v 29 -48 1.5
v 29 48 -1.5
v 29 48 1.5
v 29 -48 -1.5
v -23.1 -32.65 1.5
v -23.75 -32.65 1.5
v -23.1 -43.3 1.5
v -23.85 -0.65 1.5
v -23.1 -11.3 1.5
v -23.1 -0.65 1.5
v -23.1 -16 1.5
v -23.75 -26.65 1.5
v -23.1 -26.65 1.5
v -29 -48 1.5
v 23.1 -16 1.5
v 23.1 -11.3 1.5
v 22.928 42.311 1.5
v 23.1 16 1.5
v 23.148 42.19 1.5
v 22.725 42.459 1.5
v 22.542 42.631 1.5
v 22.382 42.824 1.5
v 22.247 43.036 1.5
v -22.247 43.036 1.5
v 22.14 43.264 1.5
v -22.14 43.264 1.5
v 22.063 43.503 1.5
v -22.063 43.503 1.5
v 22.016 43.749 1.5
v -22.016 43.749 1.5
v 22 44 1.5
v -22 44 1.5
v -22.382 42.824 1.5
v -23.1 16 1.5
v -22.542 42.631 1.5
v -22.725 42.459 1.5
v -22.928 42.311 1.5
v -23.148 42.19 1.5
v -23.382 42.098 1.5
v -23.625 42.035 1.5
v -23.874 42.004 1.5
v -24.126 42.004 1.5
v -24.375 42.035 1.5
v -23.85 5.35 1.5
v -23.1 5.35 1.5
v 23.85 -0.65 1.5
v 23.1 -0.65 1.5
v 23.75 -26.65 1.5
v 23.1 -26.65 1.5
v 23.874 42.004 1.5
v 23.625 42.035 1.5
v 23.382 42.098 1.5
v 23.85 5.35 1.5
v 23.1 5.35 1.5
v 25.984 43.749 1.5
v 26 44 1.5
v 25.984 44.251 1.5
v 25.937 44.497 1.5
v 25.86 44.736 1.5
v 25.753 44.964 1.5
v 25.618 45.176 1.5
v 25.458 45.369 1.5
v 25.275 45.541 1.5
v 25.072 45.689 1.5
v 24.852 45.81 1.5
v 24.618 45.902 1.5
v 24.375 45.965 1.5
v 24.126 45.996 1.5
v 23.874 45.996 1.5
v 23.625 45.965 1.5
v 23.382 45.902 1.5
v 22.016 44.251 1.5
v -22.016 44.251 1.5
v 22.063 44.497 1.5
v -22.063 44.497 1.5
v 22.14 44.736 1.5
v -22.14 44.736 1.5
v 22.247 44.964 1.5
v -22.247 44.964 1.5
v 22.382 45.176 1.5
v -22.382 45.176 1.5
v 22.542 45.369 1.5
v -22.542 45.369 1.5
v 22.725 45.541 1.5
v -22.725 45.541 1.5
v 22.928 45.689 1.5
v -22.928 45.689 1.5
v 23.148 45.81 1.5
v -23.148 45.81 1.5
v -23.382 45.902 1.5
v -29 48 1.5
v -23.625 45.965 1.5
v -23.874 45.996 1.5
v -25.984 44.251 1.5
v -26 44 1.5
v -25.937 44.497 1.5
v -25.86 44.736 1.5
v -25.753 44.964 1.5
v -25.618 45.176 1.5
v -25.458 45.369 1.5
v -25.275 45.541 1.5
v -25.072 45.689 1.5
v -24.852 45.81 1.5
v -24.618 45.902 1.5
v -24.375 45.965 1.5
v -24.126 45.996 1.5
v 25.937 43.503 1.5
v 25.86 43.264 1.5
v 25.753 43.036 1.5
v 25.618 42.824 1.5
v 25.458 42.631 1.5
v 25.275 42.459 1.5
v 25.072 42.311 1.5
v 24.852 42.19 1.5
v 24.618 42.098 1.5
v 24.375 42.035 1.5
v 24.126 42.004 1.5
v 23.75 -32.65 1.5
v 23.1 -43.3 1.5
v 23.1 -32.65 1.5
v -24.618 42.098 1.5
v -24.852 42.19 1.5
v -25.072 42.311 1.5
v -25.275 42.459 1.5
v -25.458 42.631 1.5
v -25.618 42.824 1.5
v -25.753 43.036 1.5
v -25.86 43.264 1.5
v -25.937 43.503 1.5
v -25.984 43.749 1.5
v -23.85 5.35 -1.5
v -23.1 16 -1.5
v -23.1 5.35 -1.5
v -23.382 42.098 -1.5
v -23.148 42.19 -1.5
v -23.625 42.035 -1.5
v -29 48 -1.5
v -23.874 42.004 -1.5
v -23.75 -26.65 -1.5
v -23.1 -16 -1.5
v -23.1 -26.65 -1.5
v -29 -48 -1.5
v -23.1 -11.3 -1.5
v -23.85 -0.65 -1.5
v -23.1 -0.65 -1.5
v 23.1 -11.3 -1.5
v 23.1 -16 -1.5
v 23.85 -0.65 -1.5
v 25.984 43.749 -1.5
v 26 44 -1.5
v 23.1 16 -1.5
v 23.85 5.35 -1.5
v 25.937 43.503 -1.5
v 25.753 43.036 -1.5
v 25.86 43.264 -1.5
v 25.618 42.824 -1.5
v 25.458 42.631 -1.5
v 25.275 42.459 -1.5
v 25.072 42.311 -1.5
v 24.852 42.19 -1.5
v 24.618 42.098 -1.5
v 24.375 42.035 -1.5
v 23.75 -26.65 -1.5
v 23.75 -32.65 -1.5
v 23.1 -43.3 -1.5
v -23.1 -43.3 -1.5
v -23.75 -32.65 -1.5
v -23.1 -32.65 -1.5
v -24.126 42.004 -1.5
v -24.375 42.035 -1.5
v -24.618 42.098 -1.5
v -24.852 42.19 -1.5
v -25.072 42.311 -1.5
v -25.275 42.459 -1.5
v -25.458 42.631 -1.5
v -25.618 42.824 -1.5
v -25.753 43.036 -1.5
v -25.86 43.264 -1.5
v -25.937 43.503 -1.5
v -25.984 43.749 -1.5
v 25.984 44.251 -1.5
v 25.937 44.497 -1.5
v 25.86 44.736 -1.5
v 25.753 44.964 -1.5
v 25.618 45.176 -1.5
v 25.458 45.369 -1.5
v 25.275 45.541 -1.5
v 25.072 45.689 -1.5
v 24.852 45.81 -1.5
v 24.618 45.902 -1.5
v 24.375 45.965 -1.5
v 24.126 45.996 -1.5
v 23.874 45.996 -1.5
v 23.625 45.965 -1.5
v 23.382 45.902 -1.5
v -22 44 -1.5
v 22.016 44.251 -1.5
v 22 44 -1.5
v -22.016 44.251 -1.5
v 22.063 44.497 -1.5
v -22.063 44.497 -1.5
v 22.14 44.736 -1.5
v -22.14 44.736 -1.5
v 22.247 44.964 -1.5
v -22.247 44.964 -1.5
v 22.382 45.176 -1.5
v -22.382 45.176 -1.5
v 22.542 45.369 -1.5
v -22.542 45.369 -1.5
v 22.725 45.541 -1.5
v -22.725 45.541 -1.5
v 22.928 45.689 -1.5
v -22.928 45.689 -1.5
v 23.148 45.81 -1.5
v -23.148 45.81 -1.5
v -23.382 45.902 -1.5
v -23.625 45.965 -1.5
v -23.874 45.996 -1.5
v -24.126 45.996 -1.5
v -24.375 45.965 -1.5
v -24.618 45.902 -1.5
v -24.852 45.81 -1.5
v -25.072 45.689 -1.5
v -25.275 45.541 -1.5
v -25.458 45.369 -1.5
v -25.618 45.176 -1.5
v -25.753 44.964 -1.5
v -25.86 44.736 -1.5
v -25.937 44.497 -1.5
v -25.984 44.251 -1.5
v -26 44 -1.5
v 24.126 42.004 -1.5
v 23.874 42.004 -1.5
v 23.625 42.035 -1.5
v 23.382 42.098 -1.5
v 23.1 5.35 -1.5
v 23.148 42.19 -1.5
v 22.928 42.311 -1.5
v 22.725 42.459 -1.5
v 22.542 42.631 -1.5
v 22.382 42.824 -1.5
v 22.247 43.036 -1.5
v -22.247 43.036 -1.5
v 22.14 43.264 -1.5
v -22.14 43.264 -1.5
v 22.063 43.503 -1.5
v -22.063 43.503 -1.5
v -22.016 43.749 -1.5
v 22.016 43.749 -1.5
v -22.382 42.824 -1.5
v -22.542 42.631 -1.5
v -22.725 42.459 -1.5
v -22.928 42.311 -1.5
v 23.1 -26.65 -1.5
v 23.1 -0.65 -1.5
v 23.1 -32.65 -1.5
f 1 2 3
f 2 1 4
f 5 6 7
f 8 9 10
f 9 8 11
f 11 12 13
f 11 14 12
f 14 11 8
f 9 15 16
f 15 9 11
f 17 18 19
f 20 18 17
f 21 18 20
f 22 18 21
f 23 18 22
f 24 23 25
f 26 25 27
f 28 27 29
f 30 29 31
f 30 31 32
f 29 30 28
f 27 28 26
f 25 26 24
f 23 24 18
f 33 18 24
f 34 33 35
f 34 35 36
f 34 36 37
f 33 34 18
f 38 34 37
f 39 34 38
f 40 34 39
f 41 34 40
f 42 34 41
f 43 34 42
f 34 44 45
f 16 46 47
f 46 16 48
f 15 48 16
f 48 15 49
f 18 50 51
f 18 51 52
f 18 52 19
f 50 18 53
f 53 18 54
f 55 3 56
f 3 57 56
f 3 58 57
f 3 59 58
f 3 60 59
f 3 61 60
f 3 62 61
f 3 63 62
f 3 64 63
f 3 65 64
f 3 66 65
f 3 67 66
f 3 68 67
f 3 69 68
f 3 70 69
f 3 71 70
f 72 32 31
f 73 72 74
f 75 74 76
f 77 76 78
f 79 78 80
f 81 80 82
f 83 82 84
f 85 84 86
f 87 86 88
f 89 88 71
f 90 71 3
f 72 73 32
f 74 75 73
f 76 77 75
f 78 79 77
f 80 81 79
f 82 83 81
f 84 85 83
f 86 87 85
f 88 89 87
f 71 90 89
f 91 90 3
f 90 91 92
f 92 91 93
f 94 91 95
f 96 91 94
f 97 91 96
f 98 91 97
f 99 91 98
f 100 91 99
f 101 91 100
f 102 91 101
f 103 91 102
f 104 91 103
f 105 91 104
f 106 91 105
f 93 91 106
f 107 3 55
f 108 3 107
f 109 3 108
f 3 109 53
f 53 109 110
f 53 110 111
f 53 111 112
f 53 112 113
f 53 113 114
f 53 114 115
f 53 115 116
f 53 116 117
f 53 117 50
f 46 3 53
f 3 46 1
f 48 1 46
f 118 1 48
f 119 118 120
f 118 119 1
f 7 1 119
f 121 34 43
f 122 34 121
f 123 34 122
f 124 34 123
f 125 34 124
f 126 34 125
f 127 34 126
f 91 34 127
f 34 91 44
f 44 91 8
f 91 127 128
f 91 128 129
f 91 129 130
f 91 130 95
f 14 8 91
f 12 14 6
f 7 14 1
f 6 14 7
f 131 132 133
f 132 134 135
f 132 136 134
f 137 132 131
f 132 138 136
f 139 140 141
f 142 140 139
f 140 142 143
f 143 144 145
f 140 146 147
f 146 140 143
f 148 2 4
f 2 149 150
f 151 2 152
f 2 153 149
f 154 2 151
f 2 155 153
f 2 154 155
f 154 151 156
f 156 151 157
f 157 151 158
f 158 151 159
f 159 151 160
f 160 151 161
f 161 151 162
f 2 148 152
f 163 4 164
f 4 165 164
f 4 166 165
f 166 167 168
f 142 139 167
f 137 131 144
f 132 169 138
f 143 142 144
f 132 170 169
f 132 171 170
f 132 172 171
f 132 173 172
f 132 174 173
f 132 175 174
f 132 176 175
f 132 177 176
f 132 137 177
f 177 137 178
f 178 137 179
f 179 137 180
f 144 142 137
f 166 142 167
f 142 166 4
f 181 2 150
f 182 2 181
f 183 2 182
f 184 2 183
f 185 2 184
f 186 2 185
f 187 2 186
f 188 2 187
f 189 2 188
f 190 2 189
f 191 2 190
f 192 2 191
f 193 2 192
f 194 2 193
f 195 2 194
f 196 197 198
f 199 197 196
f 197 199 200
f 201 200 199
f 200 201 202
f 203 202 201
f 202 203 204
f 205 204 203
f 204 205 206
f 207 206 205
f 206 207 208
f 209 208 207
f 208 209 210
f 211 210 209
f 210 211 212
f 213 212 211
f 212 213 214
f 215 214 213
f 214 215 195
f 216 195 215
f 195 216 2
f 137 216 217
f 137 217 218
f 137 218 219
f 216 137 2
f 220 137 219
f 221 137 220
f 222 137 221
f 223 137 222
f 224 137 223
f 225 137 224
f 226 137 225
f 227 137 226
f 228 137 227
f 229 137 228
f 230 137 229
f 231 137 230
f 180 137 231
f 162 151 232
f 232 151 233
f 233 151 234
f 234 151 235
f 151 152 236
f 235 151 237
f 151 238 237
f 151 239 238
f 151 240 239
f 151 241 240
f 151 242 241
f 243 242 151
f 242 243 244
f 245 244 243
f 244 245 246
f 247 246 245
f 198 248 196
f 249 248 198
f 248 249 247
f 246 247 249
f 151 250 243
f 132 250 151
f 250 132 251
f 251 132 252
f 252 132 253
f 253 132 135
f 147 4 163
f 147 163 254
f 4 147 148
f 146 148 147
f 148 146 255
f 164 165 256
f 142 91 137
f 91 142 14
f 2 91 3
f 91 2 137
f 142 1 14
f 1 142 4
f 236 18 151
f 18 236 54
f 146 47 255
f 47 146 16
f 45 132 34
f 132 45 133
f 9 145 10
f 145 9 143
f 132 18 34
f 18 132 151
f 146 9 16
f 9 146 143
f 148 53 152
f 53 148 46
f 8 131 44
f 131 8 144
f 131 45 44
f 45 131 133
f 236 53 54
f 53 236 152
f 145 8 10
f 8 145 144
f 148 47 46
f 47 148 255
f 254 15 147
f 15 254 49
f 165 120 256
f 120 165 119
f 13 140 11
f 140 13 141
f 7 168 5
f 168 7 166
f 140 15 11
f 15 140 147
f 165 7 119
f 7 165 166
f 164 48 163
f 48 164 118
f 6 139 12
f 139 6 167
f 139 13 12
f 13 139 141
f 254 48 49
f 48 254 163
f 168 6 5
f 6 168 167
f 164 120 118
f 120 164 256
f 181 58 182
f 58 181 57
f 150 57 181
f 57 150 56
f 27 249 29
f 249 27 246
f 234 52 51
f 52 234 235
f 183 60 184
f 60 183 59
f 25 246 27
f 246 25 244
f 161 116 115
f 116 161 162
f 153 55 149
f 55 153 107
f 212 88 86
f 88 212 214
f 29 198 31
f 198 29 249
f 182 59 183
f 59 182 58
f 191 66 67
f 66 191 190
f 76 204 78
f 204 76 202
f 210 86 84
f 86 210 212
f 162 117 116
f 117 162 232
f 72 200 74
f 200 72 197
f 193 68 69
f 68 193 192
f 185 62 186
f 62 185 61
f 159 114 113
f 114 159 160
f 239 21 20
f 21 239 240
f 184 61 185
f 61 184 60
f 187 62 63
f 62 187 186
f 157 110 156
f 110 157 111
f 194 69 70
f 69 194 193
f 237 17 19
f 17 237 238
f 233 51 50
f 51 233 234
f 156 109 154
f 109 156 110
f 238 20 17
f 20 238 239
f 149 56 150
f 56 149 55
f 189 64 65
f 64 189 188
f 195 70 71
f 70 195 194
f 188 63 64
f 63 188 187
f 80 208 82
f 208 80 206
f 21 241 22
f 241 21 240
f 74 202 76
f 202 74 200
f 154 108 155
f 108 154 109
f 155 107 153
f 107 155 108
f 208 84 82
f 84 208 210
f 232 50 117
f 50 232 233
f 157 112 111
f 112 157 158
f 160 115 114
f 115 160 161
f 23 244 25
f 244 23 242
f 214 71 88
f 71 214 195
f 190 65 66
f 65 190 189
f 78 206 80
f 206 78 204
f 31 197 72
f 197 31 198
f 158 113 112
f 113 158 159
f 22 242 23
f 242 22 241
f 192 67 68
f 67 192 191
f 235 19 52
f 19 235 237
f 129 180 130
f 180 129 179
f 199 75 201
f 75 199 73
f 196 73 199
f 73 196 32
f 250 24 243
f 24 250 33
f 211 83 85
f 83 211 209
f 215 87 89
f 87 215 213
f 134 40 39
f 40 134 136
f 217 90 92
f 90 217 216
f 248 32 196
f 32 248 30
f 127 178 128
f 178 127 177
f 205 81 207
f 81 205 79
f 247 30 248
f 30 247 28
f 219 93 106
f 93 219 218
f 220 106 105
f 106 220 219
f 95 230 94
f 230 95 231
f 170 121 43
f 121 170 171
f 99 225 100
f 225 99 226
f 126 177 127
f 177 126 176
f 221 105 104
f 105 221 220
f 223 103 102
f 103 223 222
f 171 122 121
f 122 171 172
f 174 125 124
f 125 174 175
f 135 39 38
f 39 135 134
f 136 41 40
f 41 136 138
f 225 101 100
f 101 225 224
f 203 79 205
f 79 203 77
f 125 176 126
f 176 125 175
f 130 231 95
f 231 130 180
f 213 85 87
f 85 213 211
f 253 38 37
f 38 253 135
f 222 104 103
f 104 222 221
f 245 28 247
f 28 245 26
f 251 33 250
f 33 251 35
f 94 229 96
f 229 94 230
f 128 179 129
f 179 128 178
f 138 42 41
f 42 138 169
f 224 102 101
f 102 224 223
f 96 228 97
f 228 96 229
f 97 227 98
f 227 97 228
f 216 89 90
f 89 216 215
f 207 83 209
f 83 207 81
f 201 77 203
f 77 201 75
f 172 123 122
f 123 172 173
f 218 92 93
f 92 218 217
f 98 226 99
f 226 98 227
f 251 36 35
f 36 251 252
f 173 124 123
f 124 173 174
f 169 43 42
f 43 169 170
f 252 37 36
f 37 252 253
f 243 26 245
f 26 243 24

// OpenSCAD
// meter bezel

meter_height = 27.3;
meter_length = 46.2;

// distance from top
glass_blackout = 32;
meter_separation = 32;

bezel_margin = 6;
bezel_thickness = 3;
bezel_height = glass_blackout + 13 + meter_separation + 13 + bezel_margin;
bezel_width = 46 + 2 * bezel_margin;
echo ("bezel_width", bezel_width);

m4_dia = 4;
m4_pilot = 3.3;
vert_m4_x_offset = (bezel_width - (2*10) - 4 - 10)/2;
echo ("m4 offset", vert_m4_x_offset);

mounting_block_thickness = 10;
mounting_block_depth = 10;

$fn = 50;

difference () {
    {
        union () {
        cube([bezel_width, bezel_height, bezel_thickness], center = true);
        

        }
    }
    {
        // top meter
        // water temp
        translate([0, bezel_height/2 - glass_blackout - meter_height/2, 0])
        cube([meter_length, meter_height, bezel_thickness], center = true);
        
        translate([0, bezel_height/2 - glass_blackout - meter_height/2, 0])
        cube([47.7, 6, bezel_thickness], center = true);
        
        // bottom meter
        // air temp
        translate([0, 
            bezel_height/2 - glass_blackout - meter_height/2 - meter_separation, 
            0])
        cube([meter_length, meter_height, bezel_thickness], center = true);
        
        // mounting relief
        translate([0, 
            bezel_height/2 - glass_blackout - meter_height/2 - meter_separation, 
            0])
        cube([47.5, 6, bezel_thickness], center = true);       
        
        // - bezel to plate - horizontal holes
        // PASS-THRU
        echo ("mount hole from edge", bezel_height/2  - 4);
        translate([bezel_width/2 - 10/2,
            bezel_height/2  - 4,
            0])
        cylinder(r = m4_dia/2, h = 4, center = true);
        
        translate([-(bezel_width/2 - 10/2),
            bezel_height/2  - 4,
            0])
        cylinder(r = m4_dia/2, h = 4, center = true);

    }
}
